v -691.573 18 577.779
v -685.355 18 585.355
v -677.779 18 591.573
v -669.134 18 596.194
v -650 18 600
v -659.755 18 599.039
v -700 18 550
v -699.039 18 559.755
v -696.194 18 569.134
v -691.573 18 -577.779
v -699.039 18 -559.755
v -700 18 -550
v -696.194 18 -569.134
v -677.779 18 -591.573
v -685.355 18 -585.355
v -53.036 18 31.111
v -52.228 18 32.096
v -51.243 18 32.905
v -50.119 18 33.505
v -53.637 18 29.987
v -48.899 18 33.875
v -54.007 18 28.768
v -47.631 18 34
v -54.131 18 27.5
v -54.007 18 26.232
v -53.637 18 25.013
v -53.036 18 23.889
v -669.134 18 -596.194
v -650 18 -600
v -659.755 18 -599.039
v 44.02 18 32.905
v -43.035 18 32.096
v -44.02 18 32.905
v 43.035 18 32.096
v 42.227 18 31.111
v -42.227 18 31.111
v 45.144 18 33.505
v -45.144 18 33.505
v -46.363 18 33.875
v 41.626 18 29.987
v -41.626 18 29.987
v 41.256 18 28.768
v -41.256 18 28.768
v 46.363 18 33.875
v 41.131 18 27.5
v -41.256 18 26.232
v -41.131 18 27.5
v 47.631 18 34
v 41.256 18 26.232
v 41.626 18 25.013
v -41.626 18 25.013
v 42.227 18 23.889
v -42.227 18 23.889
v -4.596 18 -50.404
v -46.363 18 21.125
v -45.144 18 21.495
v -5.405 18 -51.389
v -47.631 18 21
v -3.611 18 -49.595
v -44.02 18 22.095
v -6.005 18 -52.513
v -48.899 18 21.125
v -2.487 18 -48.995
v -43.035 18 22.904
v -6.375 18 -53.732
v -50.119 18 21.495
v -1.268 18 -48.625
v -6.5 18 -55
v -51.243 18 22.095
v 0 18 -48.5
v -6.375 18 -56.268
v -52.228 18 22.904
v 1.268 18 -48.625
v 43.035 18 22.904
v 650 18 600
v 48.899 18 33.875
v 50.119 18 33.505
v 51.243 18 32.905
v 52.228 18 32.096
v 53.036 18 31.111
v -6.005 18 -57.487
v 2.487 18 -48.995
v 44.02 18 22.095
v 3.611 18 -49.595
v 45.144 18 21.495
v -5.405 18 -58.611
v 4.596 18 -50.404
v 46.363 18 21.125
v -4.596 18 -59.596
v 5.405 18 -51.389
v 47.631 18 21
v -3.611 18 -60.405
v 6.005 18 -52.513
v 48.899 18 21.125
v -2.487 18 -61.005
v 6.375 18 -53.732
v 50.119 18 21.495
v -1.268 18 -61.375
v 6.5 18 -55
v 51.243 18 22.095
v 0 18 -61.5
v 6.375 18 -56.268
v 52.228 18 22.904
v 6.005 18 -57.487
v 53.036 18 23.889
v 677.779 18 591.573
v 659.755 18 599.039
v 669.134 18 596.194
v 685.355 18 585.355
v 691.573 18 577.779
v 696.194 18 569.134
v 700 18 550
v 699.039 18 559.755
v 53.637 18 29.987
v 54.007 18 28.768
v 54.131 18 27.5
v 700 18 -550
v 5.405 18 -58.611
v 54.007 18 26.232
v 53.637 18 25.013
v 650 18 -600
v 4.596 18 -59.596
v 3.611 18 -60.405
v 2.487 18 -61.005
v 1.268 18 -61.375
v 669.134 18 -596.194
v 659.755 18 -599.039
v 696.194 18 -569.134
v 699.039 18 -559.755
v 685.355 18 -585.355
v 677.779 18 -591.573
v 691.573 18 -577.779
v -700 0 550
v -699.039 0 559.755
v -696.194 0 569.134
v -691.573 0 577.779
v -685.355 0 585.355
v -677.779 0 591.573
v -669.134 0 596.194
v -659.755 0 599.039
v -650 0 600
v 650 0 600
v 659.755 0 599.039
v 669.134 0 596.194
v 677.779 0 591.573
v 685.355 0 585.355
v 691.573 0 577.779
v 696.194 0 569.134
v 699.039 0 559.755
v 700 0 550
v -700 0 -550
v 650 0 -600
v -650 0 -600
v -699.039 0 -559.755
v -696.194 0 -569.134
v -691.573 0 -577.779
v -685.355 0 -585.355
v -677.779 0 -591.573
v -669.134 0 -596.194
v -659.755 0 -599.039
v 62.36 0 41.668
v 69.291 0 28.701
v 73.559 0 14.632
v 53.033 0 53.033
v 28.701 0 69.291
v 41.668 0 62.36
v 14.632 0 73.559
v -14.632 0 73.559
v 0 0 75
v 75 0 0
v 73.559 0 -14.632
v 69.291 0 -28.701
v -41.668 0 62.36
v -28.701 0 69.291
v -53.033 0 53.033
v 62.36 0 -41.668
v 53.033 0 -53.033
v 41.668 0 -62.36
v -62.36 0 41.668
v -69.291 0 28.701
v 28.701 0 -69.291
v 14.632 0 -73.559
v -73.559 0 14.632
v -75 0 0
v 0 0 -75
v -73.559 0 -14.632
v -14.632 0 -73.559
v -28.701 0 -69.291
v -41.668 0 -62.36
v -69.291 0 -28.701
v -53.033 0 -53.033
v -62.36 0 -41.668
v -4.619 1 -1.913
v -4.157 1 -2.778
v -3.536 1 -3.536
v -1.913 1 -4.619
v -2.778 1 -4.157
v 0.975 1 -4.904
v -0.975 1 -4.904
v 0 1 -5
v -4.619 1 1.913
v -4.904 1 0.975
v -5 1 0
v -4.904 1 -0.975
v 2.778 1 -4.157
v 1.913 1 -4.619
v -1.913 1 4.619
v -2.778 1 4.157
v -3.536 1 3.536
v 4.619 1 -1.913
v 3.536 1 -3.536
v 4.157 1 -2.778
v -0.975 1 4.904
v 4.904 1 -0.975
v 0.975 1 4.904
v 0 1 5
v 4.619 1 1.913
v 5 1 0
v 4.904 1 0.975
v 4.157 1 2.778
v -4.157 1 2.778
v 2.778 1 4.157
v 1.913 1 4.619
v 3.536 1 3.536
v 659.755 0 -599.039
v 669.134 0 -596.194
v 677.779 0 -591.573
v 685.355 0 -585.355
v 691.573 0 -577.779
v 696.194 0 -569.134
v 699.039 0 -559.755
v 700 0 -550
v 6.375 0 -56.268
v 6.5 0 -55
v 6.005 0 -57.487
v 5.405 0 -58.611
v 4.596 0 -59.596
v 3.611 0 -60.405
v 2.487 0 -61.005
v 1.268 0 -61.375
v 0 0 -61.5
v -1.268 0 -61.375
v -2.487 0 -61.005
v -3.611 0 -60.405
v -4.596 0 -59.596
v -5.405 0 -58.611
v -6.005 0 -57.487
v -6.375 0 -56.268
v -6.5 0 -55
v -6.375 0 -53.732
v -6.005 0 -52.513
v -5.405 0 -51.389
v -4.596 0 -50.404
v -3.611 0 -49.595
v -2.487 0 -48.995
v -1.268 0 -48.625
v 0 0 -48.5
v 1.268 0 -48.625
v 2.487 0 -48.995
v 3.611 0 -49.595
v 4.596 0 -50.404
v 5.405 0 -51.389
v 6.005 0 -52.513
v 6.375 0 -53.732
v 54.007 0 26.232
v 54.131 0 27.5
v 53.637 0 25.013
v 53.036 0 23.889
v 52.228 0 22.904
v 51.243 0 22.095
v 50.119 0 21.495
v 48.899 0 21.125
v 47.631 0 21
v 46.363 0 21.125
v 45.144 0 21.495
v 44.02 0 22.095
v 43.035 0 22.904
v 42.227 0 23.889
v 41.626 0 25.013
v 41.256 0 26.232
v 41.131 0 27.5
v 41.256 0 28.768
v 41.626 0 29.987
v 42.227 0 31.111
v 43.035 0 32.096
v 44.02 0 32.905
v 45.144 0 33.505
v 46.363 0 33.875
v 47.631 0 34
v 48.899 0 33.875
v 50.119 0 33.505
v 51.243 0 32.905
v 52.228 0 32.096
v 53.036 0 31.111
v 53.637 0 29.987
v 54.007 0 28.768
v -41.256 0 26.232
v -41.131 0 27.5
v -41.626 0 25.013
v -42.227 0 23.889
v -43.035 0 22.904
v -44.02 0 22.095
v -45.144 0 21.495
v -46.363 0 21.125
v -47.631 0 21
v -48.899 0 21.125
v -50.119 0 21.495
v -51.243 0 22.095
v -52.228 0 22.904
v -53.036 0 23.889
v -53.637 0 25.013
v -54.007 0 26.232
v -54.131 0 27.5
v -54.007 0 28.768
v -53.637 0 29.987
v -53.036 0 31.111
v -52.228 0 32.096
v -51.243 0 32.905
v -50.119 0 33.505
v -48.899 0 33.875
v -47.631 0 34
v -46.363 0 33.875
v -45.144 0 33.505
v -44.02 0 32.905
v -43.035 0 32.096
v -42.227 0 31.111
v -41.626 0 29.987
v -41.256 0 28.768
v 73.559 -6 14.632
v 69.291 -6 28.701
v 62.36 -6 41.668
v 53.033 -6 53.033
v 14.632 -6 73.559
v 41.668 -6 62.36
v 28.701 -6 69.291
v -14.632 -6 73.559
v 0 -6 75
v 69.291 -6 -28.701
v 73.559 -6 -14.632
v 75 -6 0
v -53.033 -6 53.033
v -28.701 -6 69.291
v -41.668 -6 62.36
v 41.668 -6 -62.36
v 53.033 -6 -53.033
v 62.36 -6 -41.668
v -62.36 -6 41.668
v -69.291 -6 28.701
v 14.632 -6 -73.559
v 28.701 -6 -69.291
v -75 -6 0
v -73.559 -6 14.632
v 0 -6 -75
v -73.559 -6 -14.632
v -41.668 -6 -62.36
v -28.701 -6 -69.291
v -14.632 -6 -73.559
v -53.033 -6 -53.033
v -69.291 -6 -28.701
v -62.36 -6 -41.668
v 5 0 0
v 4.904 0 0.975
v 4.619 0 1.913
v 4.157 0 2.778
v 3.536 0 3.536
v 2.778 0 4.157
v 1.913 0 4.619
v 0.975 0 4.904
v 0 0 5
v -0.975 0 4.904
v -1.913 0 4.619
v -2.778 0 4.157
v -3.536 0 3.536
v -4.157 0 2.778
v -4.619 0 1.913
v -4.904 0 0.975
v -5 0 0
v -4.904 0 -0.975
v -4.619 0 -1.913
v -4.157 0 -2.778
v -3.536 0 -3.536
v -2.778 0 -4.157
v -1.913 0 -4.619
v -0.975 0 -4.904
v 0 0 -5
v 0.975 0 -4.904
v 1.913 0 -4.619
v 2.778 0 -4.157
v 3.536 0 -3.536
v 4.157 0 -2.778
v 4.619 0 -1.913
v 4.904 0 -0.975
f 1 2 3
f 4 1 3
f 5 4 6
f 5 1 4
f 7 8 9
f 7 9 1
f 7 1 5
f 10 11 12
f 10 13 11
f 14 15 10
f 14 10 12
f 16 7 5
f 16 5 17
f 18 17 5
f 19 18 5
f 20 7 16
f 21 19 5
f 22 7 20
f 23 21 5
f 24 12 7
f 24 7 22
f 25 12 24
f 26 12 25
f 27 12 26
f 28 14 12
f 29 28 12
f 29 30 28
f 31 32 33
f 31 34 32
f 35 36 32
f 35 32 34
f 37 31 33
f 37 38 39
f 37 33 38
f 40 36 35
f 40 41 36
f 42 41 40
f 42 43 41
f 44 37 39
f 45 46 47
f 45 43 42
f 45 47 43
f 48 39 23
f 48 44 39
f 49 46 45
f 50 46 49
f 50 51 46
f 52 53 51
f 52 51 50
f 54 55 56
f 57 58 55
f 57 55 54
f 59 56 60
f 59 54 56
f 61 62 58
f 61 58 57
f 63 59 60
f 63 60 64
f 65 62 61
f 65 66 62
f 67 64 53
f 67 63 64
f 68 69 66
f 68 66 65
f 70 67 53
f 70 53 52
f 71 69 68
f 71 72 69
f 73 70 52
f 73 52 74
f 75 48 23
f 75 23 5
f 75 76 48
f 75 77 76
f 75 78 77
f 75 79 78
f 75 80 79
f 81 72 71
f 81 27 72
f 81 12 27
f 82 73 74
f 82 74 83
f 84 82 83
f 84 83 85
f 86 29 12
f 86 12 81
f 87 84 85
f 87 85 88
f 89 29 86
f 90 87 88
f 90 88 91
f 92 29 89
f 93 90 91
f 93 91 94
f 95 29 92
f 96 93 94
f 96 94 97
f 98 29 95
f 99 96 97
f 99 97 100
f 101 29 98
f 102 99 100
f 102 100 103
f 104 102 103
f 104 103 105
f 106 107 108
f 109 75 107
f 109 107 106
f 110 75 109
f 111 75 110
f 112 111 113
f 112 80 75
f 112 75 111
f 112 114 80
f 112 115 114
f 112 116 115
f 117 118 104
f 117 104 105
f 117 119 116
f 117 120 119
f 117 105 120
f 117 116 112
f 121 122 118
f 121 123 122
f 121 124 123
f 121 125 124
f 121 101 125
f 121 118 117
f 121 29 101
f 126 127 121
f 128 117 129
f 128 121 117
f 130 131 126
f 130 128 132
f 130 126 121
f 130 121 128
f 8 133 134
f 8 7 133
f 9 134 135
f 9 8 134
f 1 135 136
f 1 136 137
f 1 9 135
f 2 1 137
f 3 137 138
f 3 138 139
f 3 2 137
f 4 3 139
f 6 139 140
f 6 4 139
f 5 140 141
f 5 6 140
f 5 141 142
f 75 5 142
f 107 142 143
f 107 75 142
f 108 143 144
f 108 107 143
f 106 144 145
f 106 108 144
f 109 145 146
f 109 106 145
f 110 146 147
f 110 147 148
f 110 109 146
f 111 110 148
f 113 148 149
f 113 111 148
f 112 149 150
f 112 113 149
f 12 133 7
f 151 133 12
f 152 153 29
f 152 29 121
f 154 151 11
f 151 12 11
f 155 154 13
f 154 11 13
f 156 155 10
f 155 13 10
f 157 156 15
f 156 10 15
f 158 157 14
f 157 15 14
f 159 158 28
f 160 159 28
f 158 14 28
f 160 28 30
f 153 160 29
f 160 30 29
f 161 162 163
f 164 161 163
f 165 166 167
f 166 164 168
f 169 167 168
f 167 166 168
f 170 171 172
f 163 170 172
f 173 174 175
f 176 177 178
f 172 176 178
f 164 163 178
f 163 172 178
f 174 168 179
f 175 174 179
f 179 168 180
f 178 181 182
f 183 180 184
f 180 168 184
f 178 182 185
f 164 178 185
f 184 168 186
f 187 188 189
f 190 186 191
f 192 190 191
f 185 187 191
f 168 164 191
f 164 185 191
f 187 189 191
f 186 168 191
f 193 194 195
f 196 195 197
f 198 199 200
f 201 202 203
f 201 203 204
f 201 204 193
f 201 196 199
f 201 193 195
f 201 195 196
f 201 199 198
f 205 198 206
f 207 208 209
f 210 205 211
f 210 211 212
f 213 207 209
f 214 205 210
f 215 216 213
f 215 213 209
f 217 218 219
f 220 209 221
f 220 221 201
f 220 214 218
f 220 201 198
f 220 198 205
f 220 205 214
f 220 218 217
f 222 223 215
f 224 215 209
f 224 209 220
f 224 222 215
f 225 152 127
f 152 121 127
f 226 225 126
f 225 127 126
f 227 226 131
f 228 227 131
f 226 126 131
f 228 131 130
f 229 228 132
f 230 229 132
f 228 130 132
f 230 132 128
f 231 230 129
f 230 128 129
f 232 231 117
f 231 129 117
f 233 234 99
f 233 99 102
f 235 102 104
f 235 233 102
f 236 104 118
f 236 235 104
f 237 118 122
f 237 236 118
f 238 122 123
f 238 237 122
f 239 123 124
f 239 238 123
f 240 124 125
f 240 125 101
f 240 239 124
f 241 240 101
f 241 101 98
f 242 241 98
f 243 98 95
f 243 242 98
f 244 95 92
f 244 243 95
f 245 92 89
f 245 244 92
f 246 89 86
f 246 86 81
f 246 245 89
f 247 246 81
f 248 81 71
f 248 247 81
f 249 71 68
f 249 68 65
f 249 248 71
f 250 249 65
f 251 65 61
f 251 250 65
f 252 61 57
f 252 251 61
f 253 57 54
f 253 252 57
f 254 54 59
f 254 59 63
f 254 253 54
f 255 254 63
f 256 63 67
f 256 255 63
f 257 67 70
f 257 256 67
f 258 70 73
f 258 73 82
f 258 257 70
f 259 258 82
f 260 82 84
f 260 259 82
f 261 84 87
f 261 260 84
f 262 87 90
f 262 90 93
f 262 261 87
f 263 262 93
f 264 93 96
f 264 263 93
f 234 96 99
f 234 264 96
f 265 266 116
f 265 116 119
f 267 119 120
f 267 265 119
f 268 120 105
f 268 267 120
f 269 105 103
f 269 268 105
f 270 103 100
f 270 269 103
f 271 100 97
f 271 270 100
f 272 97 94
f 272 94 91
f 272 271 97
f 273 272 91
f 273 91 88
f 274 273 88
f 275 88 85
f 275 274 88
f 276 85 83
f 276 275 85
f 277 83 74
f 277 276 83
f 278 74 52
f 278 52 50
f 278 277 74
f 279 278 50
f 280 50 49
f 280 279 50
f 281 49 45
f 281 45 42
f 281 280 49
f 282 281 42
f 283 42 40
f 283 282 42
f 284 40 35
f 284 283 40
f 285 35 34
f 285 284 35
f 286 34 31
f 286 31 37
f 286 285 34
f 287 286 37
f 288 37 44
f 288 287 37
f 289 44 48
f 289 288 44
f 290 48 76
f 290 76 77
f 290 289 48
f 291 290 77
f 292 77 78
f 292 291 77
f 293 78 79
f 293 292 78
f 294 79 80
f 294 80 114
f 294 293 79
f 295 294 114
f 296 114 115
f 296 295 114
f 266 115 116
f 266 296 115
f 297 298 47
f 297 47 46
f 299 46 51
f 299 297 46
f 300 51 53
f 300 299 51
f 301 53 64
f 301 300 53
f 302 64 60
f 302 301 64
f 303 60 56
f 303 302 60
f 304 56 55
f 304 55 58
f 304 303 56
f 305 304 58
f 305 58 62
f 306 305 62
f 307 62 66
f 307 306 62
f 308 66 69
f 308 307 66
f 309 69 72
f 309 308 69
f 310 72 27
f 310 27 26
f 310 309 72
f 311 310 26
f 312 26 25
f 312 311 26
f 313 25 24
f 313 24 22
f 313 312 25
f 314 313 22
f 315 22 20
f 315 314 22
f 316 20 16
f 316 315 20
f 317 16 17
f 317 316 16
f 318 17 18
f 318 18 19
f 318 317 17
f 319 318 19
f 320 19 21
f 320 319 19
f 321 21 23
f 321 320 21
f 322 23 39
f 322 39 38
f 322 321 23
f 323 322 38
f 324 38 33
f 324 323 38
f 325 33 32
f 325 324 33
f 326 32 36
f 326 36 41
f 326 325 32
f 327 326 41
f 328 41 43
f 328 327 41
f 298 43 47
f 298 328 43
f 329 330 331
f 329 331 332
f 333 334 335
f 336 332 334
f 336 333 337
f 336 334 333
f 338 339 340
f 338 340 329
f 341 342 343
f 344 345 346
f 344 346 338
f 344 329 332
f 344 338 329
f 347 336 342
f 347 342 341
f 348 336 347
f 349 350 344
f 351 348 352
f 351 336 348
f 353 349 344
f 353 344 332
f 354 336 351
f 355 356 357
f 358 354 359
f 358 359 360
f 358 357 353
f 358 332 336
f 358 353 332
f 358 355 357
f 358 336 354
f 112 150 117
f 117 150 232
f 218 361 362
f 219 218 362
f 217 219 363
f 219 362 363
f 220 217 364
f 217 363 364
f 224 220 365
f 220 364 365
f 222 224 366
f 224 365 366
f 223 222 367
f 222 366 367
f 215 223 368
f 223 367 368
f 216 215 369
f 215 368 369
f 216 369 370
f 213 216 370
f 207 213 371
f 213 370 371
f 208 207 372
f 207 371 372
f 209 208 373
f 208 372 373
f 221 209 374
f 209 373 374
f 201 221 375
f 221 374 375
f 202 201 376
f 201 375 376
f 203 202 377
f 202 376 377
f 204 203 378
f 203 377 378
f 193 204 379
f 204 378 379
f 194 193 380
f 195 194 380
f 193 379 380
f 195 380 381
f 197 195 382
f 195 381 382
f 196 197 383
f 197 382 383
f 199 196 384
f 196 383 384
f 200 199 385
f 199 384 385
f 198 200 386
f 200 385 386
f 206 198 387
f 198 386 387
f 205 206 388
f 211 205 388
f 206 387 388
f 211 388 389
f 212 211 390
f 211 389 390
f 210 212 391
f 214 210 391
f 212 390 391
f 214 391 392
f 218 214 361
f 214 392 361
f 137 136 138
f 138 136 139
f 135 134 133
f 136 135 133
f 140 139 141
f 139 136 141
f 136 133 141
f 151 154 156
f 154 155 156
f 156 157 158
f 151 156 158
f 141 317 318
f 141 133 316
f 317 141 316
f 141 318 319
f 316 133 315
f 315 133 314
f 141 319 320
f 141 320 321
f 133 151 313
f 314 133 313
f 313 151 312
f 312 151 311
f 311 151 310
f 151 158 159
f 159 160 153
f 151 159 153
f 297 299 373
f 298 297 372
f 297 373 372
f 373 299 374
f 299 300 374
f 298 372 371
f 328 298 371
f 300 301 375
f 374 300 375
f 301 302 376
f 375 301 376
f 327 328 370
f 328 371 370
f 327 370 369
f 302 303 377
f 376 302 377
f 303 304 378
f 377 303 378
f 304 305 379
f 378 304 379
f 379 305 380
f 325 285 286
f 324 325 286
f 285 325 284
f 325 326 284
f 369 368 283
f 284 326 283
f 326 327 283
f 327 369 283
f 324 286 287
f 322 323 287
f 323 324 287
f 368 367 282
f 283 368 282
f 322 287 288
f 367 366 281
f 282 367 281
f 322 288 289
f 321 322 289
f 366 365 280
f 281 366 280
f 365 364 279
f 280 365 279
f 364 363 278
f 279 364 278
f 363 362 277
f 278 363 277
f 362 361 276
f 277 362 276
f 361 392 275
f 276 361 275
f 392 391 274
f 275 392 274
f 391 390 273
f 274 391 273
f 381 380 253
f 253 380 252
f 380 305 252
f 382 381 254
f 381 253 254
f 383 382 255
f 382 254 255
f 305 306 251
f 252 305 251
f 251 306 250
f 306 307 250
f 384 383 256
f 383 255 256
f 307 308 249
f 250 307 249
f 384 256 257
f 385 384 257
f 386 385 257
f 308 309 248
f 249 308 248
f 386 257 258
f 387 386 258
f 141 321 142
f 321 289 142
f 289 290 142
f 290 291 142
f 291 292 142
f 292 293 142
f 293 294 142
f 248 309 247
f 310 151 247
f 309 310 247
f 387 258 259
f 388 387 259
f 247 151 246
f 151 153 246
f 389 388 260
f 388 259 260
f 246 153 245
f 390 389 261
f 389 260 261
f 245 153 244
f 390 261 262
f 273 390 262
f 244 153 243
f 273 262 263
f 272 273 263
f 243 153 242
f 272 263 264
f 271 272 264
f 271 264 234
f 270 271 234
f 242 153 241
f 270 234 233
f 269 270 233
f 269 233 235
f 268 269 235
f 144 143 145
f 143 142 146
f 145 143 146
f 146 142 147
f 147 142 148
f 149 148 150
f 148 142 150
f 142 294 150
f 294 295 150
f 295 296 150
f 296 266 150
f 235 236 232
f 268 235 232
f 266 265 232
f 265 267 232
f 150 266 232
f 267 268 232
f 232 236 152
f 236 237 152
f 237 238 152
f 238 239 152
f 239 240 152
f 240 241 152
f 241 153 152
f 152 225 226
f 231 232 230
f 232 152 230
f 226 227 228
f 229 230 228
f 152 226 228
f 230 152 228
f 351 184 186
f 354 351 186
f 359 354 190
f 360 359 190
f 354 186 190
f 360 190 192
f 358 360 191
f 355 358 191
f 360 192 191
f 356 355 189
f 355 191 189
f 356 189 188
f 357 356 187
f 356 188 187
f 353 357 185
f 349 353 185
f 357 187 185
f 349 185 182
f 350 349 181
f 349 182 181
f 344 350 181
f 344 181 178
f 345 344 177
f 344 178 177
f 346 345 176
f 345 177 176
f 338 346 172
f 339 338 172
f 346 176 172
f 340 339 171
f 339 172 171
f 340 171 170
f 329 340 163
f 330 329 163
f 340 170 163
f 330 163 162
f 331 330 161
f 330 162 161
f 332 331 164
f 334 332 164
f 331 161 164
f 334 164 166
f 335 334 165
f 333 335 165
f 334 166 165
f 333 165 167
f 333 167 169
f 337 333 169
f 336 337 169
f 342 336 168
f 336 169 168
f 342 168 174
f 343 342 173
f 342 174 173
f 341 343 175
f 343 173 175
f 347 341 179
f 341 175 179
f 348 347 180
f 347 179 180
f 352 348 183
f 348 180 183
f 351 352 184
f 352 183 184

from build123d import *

# Parameters (mm, degrees)
SKETCH1_W           = 1400
SKETCH1_H           = 1200
SKETCH1_R           = 6.5
BOSS_EXTRUDE1_DEPTH = 18
SKETCH2_R           = 5
CUT_EXTRUDE1_DEPTH  = 1
FILLET1_R           = 50
SKETCH4_R           = 75
BOSS_EXTRUDE2_DEPTH = 6


with BuildPart() as part:
    # Sketch1 → Boss-Extrude1 (new body)
    with BuildSketch(Plane(origin=(0, 0, 0), x_dir=(1, 0, 0), z_dir=(0, 1, 0))):
        Rectangle(SKETCH1_W, SKETCH1_H)
        with Locations((0, 55)):
            Circle(SKETCH1_R, mode=Mode.SUBTRACT)
        with Locations((-47.631397208, -27.5)):
            Circle(SKETCH1_R, mode=Mode.SUBTRACT)
        with Locations((47.631397208, -27.5)):
            Circle(SKETCH1_R, mode=Mode.SUBTRACT)
    extrude(amount=BOSS_EXTRUDE1_DEPTH)

    # Sketch2 → Cut-Extrude1 (cut)
    with BuildSketch(Plane.XZ):
        Circle(SKETCH2_R)
    extrude(amount=-CUT_EXTRUDE1_DEPTH, mode=Mode.SUBTRACT)

    # Fillet1
    fillet1_edges = [part.edges().sort_by_distance(p)[0] for p in [
        (700, 9, 600),
        (-700, 9, 600),
        (-700, 9, -600),
        (700, 9, -600),
    ]]
    fillet(fillet1_edges, radius=FILLET1_R)


with BuildPart() as body_2:
    # Sketch4 → Boss-Extrude2 (new body)
    with BuildSketch(Plane(origin=(0, 0, 0), x_dir=(-1, 0, 0), z_dir=(0, -1, 0))):
        Circle(SKETCH4_R)
    extrude(amount=BOSS_EXTRUDE2_DEPTH)


solid = Compound([part.part, body_2.part])
